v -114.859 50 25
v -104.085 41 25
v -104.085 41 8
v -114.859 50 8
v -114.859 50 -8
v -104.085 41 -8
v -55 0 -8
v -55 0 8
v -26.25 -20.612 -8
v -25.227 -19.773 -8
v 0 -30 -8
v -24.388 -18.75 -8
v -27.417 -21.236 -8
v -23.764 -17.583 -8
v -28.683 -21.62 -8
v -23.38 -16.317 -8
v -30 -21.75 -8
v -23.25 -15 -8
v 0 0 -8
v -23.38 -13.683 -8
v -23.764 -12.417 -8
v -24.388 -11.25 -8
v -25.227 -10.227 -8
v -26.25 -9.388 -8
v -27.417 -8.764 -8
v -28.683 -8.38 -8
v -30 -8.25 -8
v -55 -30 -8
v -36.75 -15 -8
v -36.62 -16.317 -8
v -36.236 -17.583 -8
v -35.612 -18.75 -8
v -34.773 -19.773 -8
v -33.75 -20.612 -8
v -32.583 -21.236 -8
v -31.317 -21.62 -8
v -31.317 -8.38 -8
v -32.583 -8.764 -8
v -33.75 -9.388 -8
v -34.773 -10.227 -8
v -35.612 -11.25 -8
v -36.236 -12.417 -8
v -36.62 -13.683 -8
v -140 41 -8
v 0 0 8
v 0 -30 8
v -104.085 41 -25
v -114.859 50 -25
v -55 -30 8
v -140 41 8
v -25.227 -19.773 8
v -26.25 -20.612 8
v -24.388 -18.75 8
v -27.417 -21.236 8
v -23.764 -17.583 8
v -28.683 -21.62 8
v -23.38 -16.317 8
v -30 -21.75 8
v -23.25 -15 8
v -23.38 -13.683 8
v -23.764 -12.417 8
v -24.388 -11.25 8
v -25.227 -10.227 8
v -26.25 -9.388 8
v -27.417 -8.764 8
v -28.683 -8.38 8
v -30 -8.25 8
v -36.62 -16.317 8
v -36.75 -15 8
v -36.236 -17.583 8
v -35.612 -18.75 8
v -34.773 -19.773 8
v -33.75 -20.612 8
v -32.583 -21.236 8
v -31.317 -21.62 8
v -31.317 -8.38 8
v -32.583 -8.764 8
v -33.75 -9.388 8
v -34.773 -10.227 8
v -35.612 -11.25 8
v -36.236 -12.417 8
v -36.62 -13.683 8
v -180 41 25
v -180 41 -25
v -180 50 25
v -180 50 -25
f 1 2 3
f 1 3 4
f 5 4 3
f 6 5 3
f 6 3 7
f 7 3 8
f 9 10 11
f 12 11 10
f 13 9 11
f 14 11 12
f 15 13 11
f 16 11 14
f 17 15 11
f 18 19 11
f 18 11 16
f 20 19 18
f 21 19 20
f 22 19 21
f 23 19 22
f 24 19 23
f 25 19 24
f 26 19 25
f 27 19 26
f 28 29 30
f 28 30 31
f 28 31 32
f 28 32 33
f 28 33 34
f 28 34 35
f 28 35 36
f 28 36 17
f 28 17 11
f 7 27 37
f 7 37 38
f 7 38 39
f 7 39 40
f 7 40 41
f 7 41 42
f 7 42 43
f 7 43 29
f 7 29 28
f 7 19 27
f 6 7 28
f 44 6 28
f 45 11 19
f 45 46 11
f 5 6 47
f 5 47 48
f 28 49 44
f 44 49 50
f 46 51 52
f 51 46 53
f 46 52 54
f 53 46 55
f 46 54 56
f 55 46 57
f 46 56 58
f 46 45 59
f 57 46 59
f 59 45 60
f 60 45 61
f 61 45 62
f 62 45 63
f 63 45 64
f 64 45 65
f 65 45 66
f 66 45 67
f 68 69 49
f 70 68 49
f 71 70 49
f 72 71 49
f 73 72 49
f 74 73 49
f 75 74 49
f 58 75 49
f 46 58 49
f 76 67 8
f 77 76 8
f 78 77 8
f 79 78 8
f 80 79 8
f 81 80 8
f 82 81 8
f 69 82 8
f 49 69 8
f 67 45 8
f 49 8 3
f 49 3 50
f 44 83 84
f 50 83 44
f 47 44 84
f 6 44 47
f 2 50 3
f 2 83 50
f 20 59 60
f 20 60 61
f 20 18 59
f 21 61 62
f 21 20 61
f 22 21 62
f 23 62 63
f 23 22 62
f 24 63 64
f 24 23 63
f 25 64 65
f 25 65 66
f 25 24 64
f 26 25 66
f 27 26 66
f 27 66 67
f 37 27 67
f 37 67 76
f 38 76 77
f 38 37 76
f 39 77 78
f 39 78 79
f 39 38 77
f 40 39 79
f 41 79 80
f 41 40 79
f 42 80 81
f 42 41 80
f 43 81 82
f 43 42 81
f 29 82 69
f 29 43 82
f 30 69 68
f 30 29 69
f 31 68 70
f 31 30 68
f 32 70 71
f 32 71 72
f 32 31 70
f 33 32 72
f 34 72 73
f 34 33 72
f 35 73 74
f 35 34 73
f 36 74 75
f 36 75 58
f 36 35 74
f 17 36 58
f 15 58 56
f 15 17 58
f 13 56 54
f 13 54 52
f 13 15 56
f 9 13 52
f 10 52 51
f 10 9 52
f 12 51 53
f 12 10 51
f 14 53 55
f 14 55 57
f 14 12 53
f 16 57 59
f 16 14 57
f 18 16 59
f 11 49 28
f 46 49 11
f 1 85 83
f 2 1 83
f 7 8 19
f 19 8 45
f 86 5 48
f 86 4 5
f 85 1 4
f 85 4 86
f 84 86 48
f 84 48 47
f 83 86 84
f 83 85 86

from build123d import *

# Parameters (mm, degrees)
SZKIC1_W                    = 55
SZKIC1_H                    = 30
SZKIC1_R                    = 6.75
DODANIE_WYCI_GNI_CIE1_DEPTH = 8
DODANIE_WYCI_GNI_CIE2_DEPTH = 25


with BuildPart() as part:
    # Szkic1 → Dodanie-wyciągnięcie1 (new, symmetric)
    # profile 1 of 2: a face of its own
    with BuildSketch(Plane.XY):
        with Locations((-27.5, -15)):
            Rectangle(SZKIC1_W, SZKIC1_H)
        with Locations((-30, -15)):
            Circle(SZKIC1_R, mode=Mode.SUBTRACT)
    # profile 2 of 2: a face of its own
    with BuildSketch(Plane.XY):
        Polygon((-114.85915493, 50), (-55, 0), (-55, -30), (-140, 41), (-180, 41), (-180, 50), align=None)
    extrude(amount=DODANIE_WYCI_GNI_CIE1_DEPTH, both=True)

    # Szkic2 → Dodanie-wyciągnięcie2 (add, symmetric)
    with BuildSketch(Plane.XY):
        Polygon((-180, 41), (-140, 41), (-104.084507042, 41), (-114.85915493, 50), (-180, 50), align=None)
    extrude(amount=DODANIE_WYCI_GNI_CIE2_DEPTH, both=True)


solid = part.part
